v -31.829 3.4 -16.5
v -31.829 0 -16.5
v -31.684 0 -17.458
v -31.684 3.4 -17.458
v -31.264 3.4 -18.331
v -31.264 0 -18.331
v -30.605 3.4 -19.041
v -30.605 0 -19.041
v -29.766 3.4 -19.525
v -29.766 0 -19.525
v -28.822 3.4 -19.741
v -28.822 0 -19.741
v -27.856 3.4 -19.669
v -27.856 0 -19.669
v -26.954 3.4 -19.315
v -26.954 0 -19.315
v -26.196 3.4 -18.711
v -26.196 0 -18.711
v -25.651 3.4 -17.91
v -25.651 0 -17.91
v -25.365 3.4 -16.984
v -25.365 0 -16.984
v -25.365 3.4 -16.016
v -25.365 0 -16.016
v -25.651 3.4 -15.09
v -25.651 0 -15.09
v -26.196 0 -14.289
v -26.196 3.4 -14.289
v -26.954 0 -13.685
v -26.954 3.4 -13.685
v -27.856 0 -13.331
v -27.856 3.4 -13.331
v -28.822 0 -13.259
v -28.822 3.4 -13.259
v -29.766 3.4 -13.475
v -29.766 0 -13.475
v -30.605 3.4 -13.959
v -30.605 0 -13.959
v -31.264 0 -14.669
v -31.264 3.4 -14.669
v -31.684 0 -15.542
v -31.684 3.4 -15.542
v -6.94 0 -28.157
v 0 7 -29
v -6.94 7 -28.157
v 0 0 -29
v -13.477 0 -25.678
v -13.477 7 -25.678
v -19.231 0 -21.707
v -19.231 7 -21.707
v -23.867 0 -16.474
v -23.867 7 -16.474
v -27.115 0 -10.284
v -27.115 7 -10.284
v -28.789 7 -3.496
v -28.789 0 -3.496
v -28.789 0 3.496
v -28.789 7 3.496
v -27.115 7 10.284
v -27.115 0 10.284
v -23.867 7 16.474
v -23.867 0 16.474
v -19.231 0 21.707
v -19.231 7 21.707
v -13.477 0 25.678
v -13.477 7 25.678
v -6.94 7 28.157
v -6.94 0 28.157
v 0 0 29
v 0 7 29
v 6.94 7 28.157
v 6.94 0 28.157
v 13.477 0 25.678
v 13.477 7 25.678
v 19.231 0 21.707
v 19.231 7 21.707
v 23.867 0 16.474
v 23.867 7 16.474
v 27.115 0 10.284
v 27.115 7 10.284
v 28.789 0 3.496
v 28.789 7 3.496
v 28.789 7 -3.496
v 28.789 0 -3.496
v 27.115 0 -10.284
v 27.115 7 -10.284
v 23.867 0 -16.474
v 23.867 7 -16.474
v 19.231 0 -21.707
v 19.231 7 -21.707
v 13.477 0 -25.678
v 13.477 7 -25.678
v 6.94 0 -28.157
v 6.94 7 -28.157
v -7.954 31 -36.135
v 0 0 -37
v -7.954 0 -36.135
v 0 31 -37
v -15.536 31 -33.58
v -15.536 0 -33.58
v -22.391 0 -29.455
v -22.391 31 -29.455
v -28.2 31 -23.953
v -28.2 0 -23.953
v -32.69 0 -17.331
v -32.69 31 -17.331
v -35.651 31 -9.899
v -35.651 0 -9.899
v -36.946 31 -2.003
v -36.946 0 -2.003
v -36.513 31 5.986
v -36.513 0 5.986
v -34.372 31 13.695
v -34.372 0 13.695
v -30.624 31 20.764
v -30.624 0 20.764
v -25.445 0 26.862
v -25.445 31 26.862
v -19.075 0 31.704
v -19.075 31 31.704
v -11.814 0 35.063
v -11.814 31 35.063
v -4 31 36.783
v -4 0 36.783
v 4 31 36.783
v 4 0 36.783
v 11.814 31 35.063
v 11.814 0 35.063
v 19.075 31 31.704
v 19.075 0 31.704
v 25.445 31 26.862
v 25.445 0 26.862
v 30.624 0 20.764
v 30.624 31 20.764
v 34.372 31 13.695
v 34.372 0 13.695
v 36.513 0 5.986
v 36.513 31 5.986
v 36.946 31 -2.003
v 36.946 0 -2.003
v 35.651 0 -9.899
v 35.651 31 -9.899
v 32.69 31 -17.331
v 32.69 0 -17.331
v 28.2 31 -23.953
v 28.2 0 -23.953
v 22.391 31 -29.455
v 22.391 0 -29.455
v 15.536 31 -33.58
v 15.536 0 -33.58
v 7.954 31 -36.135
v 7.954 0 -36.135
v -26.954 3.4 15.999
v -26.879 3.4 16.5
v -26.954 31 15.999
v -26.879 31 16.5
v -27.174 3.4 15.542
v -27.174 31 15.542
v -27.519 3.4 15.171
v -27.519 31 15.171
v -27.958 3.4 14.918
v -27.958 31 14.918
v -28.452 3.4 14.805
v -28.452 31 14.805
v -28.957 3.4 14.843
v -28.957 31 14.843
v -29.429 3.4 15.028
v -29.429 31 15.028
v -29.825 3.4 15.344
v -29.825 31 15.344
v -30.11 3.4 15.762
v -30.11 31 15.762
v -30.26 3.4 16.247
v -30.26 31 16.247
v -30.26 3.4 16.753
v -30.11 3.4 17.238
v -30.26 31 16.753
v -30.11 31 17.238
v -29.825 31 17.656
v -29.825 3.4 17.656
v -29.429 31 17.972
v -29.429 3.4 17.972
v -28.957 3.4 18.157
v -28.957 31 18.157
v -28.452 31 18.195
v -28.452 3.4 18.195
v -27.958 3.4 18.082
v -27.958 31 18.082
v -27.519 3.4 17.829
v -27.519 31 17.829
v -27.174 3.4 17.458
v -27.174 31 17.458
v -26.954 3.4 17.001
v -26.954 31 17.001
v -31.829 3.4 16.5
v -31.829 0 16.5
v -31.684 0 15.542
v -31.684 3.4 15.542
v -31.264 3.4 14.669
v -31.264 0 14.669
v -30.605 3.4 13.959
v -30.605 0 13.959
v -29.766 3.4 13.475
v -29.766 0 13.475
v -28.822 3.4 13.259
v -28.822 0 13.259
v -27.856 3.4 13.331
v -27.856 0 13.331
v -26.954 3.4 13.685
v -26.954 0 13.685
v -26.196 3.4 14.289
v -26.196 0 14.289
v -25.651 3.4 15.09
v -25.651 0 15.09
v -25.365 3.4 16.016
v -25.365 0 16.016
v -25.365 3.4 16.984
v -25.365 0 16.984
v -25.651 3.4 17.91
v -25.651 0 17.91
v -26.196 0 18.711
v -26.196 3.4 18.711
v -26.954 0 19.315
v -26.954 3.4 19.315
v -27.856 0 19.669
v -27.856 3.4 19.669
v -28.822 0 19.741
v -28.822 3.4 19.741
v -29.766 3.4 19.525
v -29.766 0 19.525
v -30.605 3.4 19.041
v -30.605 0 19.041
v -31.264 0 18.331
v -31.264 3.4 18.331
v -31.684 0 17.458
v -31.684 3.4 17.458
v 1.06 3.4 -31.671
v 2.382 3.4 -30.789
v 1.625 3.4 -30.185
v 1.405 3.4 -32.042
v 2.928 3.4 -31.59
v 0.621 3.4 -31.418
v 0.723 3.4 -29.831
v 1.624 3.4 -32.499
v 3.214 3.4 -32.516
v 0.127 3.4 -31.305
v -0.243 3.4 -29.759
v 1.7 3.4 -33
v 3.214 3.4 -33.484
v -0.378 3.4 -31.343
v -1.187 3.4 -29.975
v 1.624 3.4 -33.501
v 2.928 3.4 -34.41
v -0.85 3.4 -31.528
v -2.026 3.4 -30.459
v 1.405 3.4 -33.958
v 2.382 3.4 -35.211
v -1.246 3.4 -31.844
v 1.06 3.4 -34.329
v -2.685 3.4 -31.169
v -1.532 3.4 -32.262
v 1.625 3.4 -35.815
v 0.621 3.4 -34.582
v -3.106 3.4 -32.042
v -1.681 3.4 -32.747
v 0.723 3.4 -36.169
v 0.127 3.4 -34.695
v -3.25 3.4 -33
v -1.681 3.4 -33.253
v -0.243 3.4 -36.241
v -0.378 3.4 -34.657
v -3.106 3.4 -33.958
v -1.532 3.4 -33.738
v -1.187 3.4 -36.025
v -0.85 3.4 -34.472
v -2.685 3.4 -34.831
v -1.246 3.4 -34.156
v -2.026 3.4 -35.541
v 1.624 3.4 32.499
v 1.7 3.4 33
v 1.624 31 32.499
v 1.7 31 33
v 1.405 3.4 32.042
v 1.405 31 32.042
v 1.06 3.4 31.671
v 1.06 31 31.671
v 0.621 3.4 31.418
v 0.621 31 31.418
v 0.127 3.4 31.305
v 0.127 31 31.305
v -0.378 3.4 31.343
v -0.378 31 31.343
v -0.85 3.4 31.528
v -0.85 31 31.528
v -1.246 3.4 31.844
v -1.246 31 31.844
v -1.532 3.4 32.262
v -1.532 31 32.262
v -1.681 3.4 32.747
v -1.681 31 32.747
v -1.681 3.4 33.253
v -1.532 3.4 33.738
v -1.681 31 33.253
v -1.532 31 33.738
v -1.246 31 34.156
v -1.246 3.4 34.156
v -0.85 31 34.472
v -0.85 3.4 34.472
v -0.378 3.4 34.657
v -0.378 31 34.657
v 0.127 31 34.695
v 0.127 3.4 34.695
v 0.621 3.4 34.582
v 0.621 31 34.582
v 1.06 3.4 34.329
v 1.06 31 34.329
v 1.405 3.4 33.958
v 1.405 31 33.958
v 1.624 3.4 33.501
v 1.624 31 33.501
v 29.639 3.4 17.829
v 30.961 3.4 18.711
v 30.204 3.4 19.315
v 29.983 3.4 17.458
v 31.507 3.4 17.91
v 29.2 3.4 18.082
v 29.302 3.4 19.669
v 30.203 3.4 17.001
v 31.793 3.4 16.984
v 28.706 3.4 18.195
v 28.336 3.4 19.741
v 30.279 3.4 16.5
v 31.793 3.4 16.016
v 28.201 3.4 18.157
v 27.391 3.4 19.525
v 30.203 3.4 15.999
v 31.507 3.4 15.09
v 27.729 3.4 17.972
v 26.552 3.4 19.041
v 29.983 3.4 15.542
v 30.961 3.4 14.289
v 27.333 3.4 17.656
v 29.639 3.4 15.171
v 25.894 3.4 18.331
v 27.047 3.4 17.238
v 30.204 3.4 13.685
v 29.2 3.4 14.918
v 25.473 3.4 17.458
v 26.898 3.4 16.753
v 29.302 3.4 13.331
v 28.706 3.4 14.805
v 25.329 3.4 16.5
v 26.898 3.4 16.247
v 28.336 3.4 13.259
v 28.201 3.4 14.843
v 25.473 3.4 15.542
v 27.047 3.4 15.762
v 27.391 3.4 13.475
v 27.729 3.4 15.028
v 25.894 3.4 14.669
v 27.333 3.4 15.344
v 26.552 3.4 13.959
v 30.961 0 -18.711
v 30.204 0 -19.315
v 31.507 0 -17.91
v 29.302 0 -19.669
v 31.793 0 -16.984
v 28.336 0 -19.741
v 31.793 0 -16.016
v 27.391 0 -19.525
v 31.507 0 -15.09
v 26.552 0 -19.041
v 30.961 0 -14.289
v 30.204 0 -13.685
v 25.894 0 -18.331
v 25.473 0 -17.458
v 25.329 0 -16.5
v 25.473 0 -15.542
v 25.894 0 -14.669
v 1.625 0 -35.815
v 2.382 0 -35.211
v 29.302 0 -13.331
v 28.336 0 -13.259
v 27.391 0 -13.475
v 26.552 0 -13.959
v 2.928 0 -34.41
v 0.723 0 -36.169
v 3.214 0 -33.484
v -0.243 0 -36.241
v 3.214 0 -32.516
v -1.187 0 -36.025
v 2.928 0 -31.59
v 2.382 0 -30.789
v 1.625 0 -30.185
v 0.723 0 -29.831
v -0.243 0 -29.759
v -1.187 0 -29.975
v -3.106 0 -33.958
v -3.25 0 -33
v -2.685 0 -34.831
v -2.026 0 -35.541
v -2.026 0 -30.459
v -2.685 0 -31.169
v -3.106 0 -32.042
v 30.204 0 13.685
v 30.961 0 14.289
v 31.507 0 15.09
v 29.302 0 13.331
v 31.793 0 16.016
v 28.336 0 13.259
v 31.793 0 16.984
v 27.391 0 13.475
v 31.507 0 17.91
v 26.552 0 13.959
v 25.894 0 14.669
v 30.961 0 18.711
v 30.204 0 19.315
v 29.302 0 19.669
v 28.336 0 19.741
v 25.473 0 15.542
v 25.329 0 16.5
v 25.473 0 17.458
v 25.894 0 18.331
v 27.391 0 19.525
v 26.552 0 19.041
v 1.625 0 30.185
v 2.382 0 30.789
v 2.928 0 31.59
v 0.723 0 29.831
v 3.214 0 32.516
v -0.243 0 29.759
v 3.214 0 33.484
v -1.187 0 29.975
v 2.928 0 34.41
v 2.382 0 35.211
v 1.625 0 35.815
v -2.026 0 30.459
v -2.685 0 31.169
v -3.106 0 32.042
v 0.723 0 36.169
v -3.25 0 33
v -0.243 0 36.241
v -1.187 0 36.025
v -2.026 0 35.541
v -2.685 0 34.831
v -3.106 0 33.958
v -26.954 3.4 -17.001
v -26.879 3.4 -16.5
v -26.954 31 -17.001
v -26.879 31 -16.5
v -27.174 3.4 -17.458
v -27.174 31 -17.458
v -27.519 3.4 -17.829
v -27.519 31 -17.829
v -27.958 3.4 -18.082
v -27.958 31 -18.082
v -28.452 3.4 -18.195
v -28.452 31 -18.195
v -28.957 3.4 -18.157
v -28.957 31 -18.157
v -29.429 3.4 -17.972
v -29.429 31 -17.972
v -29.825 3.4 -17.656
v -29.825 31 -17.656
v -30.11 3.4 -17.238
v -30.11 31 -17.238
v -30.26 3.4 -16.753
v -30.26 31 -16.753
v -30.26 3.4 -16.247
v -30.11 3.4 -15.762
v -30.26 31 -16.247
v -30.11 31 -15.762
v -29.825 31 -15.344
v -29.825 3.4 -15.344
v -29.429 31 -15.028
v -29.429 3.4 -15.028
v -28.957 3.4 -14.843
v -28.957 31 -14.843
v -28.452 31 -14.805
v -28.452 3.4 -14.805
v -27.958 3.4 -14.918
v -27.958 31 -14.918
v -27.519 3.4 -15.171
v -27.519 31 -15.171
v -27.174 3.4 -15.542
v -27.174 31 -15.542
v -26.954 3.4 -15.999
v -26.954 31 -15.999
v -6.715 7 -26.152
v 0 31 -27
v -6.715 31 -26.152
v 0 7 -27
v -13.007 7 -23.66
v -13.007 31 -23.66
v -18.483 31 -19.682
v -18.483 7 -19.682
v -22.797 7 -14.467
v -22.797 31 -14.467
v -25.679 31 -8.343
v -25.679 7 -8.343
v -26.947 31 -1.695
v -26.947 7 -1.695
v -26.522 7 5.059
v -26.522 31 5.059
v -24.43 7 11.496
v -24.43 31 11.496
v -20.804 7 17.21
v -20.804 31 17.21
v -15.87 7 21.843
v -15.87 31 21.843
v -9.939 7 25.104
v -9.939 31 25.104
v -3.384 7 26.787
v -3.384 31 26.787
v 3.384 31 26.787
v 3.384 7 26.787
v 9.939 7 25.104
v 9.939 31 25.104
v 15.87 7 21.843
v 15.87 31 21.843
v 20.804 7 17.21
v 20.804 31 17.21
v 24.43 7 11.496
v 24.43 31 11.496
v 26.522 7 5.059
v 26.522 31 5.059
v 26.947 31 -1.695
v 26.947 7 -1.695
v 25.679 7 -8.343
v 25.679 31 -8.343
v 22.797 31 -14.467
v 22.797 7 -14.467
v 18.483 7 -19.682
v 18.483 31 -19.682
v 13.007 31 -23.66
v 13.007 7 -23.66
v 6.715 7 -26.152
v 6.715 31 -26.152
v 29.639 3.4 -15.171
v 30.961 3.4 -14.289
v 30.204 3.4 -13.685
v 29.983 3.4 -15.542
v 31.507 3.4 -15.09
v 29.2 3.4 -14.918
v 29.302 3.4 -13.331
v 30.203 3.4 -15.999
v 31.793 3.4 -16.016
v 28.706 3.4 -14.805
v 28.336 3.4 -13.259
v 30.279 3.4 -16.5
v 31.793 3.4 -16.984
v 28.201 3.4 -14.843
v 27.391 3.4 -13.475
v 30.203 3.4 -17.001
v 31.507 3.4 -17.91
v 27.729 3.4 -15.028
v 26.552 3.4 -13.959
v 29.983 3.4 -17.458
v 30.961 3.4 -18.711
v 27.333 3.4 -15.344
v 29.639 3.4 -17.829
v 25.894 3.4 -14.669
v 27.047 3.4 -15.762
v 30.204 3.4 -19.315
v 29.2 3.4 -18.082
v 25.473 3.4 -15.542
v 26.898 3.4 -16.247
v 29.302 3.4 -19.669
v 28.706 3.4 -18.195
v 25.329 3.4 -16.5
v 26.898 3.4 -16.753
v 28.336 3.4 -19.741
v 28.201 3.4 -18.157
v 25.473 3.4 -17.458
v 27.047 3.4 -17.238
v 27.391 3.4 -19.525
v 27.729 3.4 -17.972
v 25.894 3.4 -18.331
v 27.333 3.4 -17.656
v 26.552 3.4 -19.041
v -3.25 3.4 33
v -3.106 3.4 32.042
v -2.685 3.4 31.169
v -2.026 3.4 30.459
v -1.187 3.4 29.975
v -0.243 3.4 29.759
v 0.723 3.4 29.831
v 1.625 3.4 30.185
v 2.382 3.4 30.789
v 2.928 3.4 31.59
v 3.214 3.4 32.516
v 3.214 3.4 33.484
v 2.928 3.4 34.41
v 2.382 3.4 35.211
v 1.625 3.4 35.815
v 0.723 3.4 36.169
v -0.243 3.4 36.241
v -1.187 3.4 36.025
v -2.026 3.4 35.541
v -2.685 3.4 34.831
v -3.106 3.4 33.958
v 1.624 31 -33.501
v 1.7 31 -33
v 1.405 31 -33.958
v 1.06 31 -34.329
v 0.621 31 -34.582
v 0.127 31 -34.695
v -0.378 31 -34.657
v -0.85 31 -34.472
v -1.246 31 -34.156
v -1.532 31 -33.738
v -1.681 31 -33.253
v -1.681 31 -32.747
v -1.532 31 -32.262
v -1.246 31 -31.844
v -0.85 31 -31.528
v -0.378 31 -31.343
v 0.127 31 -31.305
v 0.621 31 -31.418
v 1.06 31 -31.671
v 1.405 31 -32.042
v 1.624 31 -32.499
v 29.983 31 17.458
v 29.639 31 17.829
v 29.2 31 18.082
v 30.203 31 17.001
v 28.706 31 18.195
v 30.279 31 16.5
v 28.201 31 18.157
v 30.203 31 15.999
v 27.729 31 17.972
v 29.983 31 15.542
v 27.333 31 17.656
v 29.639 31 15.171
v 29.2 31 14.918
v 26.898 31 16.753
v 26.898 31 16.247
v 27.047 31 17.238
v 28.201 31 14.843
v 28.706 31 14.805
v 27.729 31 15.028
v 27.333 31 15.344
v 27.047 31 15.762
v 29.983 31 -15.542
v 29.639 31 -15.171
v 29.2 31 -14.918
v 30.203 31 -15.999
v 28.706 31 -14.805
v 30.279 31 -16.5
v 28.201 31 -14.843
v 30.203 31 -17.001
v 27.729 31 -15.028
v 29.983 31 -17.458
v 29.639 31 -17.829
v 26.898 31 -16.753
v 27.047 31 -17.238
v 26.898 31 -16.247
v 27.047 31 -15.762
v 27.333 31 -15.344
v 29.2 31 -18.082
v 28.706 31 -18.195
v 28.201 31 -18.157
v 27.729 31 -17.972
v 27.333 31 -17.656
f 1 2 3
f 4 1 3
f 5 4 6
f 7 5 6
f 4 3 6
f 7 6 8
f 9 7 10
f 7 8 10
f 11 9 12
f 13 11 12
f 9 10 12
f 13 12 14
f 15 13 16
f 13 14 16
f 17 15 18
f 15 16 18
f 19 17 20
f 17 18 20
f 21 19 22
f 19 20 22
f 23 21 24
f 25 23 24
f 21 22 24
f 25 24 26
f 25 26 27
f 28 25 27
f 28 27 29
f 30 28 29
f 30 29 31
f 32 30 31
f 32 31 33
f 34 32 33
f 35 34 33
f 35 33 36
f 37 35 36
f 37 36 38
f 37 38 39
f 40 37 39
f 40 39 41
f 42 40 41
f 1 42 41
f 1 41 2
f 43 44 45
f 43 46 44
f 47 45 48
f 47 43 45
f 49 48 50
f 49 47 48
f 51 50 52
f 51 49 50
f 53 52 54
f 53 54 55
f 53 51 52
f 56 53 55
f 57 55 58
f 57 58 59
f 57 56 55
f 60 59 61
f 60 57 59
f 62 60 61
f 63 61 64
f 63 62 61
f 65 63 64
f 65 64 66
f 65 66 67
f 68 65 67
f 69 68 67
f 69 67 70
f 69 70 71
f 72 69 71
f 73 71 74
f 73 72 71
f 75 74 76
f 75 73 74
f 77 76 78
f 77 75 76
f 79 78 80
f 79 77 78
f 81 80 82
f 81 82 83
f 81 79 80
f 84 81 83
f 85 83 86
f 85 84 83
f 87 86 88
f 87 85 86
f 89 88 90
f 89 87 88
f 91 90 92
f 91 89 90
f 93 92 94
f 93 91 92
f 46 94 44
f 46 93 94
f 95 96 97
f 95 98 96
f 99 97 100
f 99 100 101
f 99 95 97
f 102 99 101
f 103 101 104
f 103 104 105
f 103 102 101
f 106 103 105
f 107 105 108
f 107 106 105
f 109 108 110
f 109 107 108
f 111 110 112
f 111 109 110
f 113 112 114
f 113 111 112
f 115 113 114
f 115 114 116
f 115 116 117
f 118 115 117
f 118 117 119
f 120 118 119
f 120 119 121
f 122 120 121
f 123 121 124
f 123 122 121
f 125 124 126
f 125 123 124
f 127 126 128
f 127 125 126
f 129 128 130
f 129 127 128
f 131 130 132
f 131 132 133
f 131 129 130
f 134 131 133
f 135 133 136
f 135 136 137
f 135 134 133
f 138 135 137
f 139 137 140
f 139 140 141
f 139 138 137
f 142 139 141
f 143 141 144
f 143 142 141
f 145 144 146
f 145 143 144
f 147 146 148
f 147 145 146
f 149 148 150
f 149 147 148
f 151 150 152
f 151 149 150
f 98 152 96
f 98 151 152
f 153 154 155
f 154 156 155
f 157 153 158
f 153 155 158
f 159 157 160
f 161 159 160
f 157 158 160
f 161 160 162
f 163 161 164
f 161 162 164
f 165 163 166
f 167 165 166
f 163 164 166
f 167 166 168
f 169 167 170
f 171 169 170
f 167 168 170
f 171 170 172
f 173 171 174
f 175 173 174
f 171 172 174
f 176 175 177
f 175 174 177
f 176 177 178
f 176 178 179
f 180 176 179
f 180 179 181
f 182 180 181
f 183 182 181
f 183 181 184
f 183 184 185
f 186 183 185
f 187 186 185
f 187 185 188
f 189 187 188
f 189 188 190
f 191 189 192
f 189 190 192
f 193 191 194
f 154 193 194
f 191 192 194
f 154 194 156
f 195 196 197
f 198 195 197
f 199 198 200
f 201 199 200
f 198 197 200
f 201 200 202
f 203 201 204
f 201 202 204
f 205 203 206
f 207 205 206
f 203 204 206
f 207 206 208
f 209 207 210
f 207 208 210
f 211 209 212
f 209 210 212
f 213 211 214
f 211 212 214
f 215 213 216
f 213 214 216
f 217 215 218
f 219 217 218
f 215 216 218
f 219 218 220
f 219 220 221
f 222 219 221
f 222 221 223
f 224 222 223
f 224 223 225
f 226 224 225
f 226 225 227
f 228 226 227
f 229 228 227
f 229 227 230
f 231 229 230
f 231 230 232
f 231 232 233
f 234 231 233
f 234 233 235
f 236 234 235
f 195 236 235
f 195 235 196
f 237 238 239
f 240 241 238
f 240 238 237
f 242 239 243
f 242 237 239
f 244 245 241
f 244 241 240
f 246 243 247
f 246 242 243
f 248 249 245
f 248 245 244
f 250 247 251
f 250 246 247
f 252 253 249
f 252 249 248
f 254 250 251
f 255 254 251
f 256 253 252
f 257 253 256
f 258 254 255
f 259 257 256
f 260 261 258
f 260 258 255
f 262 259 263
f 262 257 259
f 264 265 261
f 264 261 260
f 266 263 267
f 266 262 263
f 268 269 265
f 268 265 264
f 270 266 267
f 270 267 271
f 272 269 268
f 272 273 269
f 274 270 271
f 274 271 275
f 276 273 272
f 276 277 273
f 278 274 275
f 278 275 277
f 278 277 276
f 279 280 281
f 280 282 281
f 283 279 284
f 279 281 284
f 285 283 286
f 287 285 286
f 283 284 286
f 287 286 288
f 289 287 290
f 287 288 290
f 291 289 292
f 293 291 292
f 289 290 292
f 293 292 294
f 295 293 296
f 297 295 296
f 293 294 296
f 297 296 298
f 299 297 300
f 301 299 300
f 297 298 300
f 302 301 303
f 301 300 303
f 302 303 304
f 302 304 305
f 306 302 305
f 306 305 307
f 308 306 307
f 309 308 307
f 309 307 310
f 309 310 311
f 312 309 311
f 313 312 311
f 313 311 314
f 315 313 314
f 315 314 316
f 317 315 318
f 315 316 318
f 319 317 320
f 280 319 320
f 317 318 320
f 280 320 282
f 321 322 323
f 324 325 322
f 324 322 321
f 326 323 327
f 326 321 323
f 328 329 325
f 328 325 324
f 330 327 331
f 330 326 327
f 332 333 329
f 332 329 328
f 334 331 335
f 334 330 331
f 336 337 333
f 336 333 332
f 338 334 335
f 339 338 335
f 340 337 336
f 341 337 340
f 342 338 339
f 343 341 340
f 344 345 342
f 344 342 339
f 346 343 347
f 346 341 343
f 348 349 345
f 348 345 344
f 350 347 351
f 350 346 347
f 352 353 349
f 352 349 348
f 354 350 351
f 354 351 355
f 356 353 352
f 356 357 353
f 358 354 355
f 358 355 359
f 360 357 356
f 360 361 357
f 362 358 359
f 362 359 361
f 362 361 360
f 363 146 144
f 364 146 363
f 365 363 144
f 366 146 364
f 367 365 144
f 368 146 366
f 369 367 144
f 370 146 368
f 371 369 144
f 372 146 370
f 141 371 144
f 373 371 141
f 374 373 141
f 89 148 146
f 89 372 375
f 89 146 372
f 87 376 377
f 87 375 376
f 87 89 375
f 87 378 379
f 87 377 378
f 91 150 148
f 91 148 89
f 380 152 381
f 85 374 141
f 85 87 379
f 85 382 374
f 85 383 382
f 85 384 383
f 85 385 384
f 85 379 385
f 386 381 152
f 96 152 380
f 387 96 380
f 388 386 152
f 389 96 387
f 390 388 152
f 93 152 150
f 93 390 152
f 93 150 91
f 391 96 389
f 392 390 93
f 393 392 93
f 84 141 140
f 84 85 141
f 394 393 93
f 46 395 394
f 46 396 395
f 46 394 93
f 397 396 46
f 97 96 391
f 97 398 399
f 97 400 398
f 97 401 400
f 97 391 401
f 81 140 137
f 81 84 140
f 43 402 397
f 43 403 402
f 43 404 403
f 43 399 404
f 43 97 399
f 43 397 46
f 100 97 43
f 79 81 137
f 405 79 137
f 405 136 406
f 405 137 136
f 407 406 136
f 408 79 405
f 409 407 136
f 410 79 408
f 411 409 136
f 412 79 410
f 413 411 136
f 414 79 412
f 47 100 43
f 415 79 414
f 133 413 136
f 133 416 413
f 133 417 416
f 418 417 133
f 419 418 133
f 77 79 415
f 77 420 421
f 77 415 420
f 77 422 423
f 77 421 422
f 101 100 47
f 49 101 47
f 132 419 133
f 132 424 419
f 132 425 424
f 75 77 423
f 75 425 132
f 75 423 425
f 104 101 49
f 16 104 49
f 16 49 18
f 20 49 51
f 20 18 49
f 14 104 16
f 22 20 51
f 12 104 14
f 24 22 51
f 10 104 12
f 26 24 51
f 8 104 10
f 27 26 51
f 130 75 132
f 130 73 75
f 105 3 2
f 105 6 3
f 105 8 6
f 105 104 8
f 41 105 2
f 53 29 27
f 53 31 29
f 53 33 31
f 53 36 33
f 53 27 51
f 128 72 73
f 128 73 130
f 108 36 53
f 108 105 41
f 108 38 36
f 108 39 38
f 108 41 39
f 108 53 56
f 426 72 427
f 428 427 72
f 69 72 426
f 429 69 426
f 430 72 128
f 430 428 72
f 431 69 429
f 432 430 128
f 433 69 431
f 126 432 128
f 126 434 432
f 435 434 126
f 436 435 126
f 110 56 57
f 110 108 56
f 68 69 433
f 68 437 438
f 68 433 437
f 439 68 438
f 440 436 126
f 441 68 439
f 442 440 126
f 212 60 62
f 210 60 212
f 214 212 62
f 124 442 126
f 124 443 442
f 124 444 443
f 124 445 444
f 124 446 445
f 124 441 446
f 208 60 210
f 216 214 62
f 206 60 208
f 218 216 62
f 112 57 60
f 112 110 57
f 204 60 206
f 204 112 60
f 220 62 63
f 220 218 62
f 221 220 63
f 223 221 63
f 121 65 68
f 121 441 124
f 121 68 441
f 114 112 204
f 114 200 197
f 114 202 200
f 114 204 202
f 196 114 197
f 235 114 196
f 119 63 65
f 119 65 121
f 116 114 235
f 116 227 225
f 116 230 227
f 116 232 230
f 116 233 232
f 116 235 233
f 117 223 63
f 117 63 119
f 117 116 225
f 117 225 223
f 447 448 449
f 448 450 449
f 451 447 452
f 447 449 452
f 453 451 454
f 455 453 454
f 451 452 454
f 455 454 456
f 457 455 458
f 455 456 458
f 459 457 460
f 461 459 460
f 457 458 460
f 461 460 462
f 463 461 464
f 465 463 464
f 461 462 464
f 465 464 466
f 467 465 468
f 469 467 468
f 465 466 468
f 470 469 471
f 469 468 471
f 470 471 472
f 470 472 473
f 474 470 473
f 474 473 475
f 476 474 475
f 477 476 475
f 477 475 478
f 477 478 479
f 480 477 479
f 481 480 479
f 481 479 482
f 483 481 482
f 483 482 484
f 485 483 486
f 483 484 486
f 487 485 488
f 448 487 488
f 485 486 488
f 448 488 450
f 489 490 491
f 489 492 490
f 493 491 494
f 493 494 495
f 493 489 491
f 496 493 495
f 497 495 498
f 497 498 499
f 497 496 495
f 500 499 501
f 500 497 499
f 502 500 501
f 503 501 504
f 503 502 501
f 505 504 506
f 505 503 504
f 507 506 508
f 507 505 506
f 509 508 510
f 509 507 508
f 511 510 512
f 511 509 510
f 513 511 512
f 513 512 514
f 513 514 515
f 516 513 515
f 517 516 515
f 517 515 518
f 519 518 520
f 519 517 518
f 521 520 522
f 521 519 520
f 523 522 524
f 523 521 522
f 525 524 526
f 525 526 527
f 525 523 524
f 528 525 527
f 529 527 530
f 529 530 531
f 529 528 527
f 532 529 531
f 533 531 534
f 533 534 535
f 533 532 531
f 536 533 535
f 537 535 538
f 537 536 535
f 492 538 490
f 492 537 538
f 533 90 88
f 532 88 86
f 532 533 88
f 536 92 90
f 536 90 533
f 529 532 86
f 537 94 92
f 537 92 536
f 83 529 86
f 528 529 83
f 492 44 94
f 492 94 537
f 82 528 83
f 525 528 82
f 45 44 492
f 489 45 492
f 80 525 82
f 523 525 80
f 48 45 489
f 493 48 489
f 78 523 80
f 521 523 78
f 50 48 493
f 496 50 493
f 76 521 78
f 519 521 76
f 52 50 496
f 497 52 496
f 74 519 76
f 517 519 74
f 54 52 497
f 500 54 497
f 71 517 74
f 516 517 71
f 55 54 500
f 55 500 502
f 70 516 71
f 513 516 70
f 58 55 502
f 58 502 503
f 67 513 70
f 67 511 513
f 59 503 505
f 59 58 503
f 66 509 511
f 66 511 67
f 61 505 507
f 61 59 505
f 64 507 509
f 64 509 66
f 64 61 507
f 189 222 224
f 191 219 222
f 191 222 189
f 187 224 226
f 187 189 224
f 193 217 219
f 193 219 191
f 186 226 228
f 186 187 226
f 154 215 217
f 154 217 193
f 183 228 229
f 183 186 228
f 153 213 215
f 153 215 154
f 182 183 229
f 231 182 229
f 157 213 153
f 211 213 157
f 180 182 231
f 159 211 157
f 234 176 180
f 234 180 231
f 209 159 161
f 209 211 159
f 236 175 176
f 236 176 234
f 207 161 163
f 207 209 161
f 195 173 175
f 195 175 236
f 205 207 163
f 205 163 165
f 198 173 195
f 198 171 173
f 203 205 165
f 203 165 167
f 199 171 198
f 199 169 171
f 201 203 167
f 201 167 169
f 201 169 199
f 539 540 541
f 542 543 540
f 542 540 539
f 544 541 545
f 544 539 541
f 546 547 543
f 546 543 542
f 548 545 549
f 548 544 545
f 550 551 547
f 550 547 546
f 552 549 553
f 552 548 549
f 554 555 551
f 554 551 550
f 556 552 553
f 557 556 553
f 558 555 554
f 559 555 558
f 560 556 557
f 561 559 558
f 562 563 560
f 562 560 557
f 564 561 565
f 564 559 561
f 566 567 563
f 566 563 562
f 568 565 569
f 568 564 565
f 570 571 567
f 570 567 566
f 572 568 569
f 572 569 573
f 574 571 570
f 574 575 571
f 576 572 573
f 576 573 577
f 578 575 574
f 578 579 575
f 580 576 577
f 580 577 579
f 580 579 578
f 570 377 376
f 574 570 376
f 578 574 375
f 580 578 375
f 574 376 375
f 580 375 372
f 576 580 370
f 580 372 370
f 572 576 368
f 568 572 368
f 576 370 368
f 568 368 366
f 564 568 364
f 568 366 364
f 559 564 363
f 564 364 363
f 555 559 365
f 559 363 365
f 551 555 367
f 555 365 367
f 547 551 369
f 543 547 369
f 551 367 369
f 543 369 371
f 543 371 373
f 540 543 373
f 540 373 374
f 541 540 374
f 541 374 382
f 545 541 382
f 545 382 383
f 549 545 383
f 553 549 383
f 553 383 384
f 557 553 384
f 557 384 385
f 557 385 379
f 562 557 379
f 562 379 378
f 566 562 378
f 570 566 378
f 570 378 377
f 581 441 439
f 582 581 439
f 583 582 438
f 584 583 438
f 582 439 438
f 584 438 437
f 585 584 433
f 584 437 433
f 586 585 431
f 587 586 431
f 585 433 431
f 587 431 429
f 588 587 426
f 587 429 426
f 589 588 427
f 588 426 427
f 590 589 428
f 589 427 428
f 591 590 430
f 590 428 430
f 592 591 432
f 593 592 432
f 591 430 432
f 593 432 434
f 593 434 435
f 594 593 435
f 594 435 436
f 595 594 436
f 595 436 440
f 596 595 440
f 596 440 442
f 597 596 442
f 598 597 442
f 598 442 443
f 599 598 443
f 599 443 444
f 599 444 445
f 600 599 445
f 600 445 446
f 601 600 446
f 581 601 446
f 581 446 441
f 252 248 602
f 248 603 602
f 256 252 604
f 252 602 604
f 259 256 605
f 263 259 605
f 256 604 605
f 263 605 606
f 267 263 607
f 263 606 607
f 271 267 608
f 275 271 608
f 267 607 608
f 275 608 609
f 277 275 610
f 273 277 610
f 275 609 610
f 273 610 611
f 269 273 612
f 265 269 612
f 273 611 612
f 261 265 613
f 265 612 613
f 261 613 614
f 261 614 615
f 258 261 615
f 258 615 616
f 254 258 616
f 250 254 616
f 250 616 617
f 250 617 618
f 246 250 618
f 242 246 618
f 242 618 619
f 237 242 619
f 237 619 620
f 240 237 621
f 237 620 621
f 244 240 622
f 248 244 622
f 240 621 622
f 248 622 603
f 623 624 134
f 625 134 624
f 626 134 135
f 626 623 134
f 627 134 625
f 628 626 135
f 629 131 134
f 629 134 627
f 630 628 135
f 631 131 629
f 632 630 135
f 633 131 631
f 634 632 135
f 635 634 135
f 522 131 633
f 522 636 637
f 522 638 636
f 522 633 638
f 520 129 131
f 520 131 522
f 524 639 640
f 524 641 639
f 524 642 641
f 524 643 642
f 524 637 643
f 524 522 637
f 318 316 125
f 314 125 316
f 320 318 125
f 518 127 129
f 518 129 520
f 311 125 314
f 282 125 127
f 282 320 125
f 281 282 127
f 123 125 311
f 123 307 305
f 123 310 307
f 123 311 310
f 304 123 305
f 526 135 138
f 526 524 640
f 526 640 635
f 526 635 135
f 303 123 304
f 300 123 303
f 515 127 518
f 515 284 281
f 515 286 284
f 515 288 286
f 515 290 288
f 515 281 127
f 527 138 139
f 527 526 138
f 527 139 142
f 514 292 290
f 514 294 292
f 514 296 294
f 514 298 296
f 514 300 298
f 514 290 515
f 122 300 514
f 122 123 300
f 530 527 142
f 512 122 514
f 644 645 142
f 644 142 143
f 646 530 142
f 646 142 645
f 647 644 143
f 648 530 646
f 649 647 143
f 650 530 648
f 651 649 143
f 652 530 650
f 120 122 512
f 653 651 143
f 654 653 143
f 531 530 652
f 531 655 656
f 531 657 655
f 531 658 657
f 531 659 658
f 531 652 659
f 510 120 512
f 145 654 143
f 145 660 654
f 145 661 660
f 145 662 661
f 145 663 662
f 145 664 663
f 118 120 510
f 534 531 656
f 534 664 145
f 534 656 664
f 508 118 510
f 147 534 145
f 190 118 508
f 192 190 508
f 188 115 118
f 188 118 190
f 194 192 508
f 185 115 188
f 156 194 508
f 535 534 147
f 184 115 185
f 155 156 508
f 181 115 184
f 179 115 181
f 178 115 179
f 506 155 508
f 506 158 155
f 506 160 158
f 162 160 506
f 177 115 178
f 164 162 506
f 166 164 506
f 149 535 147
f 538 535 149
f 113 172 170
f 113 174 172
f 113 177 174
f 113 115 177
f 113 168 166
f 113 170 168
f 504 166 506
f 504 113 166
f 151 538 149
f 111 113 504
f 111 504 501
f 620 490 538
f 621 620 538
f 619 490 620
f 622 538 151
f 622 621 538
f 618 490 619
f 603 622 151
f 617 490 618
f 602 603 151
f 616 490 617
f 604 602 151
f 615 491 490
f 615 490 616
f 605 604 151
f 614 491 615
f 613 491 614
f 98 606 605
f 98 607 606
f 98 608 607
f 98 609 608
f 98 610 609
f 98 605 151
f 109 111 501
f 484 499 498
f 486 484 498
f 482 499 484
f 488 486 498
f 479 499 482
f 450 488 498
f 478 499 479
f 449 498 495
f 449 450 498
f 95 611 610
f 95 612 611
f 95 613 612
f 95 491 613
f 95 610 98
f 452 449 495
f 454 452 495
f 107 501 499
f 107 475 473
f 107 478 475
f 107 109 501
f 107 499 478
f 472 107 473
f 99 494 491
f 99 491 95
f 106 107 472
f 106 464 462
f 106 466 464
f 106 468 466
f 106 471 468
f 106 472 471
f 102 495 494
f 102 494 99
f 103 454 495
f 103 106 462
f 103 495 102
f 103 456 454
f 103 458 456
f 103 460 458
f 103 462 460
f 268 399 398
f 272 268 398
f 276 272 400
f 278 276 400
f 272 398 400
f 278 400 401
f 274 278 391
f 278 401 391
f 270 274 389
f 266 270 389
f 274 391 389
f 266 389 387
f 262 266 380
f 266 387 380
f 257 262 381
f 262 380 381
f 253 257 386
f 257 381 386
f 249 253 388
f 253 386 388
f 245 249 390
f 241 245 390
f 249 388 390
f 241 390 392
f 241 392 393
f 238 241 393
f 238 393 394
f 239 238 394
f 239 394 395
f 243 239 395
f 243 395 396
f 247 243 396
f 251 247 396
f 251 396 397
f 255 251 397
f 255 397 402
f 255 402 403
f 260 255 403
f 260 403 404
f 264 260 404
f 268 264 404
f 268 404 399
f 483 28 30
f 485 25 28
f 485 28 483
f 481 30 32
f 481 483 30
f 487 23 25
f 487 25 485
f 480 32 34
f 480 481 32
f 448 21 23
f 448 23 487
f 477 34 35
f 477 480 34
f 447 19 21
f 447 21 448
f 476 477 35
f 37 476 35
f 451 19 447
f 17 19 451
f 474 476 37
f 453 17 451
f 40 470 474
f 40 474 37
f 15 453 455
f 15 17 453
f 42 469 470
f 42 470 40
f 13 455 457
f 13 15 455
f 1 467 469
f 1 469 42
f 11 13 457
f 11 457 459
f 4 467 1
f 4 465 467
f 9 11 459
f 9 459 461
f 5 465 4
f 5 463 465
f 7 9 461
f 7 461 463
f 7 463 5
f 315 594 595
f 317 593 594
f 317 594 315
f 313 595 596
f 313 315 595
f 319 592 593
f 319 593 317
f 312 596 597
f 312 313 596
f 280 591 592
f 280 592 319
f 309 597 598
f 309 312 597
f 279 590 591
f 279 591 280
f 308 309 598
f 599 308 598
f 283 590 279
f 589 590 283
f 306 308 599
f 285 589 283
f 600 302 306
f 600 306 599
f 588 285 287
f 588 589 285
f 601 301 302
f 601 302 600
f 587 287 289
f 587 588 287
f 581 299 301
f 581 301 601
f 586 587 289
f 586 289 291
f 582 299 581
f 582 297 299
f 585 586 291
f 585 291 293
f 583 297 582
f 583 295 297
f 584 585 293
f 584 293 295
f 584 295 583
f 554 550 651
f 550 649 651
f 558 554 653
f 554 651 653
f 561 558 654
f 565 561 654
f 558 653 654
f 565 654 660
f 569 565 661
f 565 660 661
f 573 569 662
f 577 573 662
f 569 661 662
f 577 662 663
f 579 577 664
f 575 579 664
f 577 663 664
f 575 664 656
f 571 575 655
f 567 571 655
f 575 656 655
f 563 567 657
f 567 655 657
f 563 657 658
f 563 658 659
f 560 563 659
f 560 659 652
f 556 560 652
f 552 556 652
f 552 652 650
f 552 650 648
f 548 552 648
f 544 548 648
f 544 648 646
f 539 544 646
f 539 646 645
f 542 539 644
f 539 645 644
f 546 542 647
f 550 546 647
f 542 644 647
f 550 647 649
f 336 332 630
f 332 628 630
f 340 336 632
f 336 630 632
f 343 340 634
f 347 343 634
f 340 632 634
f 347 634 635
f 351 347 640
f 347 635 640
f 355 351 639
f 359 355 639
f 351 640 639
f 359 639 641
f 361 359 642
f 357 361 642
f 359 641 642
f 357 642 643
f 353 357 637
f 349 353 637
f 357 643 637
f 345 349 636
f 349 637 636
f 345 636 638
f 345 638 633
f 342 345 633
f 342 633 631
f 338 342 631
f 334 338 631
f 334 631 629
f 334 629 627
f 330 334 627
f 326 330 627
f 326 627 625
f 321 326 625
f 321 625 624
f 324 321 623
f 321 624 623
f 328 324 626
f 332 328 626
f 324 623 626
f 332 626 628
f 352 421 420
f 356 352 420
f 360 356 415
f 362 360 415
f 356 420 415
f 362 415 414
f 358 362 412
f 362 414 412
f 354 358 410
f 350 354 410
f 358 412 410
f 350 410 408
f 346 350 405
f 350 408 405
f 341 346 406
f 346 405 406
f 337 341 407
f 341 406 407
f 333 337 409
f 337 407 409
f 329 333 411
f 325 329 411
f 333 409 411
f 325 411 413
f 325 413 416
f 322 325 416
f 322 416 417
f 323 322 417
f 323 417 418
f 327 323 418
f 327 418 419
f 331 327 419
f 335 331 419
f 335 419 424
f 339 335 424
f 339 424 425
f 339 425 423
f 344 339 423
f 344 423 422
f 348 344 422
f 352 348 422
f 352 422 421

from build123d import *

# Parameters (mm, degrees)
CBORE_FOR_M3_HEX_SOCKET_HEAD_CAP_SCREW1_D           = 3.4
CBORE_FOR_M3_HEX_SOCKET_HEAD_CAP_SCREW1_CBORE_D     = 6.5
CBORE_FOR_M3_HEX_SOCKET_HEAD_CAP_SCREW1_CBORE_DEPTH = 3.4


with BuildPart() as part:
    # Sketch1 → Revolve1 (revolve)
    with BuildSketch(Plane.XY, mode=Mode.PRIVATE) as revolve1_sk:
        Polygon((29, 0), (37, 0), (37, 31), (27, 31), (27, 7), (29, 7), align=None)
    revolve(revolve1_sk.sketch.rotate(Axis((0, 0, 0), (0, 1, 0)), 90), axis=Axis((0, 0, 0), (0, 1, 0)))

    # CBORE for M3 Hex Socket Head Cap Screw1 (through all)
    with Locations(Plane(origin=(0, 0, 0), x_dir=(-1, 0, 0), z_dir=(0, -1, 0))):
        with Locations((28.578838325, -16.5), (0, -33), (-28.578838325, -16.5), (-28.578838325, 16.5), (0, 33), (28.578838325, 16.5)):
            CounterBoreHole(CBORE_FOR_M3_HEX_SOCKET_HEAD_CAP_SCREW1_D / 2, CBORE_FOR_M3_HEX_SOCKET_HEAD_CAP_SCREW1_CBORE_D / 2, CBORE_FOR_M3_HEX_SOCKET_HEAD_CAP_SCREW1_CBORE_DEPTH)


solid = part.part
